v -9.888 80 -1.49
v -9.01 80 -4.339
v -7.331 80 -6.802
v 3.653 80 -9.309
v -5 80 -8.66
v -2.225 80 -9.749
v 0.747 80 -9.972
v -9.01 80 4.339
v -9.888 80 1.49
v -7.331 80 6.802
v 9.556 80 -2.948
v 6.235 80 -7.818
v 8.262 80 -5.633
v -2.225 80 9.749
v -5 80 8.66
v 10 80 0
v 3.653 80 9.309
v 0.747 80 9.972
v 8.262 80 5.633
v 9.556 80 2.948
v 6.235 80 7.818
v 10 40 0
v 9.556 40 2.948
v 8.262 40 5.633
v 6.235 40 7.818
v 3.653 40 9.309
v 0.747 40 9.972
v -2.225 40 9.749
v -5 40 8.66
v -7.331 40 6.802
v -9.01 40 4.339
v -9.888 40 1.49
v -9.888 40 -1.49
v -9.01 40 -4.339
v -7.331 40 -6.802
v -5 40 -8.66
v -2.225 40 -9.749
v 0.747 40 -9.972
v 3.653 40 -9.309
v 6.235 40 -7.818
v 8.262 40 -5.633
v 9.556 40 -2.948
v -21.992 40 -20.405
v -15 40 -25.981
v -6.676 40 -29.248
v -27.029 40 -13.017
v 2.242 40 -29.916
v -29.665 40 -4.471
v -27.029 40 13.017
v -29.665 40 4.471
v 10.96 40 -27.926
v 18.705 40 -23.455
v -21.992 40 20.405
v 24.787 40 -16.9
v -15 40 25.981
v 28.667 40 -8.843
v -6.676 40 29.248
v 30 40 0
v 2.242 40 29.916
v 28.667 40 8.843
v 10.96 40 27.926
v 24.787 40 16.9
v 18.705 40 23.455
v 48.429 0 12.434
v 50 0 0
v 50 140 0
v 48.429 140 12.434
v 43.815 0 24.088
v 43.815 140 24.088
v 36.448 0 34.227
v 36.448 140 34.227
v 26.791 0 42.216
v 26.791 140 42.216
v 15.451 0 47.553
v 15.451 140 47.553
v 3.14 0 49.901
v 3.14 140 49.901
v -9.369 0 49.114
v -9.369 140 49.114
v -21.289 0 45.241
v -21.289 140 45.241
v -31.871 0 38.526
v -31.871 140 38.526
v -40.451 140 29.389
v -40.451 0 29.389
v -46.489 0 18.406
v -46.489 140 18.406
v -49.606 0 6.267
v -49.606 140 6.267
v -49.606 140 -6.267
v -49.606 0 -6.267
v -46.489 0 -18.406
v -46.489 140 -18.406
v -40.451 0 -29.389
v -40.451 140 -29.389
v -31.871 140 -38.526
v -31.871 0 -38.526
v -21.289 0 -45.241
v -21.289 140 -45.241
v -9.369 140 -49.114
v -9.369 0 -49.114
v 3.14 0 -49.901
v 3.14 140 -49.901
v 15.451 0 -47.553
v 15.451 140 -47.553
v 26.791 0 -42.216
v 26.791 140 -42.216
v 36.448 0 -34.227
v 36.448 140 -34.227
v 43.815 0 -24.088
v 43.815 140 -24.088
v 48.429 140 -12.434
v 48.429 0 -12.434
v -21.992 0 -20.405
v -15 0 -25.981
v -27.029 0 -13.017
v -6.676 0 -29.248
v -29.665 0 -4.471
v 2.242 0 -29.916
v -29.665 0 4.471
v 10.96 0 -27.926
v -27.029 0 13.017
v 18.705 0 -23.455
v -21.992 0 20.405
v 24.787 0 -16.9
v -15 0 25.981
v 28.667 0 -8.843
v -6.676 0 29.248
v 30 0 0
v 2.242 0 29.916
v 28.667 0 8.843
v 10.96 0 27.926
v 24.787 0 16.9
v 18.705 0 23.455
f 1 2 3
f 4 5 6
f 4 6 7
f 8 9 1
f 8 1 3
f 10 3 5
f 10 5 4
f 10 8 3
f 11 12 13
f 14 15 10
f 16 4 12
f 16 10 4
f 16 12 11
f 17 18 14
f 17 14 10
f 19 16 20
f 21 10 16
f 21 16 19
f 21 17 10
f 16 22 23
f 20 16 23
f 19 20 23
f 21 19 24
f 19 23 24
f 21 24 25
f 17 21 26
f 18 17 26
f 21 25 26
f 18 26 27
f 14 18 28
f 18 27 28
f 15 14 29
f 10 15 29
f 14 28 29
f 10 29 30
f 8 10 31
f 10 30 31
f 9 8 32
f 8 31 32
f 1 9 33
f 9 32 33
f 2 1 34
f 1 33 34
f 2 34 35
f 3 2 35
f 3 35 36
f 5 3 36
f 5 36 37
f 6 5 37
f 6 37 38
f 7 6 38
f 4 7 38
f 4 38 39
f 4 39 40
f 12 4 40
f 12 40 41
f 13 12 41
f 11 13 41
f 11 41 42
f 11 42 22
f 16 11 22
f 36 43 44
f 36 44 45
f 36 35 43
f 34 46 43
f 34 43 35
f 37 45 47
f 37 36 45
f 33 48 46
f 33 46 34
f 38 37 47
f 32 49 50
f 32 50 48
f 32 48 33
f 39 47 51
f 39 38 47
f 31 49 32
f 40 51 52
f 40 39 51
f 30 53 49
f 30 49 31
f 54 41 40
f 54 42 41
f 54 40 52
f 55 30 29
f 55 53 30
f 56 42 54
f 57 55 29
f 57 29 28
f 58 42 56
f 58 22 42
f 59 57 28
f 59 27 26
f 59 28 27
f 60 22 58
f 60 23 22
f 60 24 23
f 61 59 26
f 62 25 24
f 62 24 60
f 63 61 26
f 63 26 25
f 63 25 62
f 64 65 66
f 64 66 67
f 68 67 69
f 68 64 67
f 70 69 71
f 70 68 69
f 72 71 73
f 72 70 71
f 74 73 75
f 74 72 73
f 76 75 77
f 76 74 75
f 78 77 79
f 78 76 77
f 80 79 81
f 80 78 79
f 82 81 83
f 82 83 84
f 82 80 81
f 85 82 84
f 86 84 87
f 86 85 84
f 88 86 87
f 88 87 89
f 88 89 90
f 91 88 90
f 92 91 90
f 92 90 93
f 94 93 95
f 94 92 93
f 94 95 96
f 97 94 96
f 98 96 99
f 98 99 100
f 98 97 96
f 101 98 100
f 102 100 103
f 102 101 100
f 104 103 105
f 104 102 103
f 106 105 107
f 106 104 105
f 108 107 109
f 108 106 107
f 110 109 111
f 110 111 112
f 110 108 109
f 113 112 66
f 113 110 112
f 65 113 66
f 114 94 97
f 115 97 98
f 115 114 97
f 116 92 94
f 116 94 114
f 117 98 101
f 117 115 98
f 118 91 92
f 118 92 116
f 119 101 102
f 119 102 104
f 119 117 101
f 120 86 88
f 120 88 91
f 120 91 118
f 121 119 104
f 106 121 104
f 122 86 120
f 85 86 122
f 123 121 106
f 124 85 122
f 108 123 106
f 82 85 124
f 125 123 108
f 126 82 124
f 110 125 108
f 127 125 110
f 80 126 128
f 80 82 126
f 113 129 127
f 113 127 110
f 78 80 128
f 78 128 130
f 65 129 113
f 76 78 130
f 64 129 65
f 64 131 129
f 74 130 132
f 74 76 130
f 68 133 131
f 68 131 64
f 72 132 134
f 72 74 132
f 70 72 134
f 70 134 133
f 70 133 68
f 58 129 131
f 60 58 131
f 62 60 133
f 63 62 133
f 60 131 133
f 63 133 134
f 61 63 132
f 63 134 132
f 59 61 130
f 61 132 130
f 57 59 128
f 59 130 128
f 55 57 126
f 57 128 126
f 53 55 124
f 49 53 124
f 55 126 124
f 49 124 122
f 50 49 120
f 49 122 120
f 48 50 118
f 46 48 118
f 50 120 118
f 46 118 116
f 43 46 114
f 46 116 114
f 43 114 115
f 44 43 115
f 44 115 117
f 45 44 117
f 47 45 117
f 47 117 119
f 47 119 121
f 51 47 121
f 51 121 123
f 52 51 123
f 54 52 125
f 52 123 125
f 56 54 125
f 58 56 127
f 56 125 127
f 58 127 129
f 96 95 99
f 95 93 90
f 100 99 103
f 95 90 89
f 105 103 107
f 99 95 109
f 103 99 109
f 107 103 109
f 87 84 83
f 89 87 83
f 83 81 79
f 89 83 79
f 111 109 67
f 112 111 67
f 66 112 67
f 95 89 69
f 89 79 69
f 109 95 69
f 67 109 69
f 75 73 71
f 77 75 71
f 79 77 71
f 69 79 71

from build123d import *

# Parameters (mm, degrees)
F0_R     = 50
F1_DEPTH = 140
F2_R     = 30
F3_DEPTH = 40
F4_R     = 10
F5_DEPTH = 80


with BuildPart() as f1:
    # F0 (on Front) → F1 (new body)
    with BuildSketch(Plane.XZ):
        Circle(F0_R)
    extrude(amount=-F1_DEPTH)

    # F2 (on face) → F3 (cut)
    with BuildSketch(Plane.XZ):
        Circle(F2_R)
    extrude(amount=-F3_DEPTH, mode=Mode.SUBTRACT)

    # F4 (on face) → F5 (cut)
    with BuildSketch(Plane.XZ):
        Circle(F4_R)
    extrude(amount=-F5_DEPTH, mode=Mode.SUBTRACT)


solid = f1.part
